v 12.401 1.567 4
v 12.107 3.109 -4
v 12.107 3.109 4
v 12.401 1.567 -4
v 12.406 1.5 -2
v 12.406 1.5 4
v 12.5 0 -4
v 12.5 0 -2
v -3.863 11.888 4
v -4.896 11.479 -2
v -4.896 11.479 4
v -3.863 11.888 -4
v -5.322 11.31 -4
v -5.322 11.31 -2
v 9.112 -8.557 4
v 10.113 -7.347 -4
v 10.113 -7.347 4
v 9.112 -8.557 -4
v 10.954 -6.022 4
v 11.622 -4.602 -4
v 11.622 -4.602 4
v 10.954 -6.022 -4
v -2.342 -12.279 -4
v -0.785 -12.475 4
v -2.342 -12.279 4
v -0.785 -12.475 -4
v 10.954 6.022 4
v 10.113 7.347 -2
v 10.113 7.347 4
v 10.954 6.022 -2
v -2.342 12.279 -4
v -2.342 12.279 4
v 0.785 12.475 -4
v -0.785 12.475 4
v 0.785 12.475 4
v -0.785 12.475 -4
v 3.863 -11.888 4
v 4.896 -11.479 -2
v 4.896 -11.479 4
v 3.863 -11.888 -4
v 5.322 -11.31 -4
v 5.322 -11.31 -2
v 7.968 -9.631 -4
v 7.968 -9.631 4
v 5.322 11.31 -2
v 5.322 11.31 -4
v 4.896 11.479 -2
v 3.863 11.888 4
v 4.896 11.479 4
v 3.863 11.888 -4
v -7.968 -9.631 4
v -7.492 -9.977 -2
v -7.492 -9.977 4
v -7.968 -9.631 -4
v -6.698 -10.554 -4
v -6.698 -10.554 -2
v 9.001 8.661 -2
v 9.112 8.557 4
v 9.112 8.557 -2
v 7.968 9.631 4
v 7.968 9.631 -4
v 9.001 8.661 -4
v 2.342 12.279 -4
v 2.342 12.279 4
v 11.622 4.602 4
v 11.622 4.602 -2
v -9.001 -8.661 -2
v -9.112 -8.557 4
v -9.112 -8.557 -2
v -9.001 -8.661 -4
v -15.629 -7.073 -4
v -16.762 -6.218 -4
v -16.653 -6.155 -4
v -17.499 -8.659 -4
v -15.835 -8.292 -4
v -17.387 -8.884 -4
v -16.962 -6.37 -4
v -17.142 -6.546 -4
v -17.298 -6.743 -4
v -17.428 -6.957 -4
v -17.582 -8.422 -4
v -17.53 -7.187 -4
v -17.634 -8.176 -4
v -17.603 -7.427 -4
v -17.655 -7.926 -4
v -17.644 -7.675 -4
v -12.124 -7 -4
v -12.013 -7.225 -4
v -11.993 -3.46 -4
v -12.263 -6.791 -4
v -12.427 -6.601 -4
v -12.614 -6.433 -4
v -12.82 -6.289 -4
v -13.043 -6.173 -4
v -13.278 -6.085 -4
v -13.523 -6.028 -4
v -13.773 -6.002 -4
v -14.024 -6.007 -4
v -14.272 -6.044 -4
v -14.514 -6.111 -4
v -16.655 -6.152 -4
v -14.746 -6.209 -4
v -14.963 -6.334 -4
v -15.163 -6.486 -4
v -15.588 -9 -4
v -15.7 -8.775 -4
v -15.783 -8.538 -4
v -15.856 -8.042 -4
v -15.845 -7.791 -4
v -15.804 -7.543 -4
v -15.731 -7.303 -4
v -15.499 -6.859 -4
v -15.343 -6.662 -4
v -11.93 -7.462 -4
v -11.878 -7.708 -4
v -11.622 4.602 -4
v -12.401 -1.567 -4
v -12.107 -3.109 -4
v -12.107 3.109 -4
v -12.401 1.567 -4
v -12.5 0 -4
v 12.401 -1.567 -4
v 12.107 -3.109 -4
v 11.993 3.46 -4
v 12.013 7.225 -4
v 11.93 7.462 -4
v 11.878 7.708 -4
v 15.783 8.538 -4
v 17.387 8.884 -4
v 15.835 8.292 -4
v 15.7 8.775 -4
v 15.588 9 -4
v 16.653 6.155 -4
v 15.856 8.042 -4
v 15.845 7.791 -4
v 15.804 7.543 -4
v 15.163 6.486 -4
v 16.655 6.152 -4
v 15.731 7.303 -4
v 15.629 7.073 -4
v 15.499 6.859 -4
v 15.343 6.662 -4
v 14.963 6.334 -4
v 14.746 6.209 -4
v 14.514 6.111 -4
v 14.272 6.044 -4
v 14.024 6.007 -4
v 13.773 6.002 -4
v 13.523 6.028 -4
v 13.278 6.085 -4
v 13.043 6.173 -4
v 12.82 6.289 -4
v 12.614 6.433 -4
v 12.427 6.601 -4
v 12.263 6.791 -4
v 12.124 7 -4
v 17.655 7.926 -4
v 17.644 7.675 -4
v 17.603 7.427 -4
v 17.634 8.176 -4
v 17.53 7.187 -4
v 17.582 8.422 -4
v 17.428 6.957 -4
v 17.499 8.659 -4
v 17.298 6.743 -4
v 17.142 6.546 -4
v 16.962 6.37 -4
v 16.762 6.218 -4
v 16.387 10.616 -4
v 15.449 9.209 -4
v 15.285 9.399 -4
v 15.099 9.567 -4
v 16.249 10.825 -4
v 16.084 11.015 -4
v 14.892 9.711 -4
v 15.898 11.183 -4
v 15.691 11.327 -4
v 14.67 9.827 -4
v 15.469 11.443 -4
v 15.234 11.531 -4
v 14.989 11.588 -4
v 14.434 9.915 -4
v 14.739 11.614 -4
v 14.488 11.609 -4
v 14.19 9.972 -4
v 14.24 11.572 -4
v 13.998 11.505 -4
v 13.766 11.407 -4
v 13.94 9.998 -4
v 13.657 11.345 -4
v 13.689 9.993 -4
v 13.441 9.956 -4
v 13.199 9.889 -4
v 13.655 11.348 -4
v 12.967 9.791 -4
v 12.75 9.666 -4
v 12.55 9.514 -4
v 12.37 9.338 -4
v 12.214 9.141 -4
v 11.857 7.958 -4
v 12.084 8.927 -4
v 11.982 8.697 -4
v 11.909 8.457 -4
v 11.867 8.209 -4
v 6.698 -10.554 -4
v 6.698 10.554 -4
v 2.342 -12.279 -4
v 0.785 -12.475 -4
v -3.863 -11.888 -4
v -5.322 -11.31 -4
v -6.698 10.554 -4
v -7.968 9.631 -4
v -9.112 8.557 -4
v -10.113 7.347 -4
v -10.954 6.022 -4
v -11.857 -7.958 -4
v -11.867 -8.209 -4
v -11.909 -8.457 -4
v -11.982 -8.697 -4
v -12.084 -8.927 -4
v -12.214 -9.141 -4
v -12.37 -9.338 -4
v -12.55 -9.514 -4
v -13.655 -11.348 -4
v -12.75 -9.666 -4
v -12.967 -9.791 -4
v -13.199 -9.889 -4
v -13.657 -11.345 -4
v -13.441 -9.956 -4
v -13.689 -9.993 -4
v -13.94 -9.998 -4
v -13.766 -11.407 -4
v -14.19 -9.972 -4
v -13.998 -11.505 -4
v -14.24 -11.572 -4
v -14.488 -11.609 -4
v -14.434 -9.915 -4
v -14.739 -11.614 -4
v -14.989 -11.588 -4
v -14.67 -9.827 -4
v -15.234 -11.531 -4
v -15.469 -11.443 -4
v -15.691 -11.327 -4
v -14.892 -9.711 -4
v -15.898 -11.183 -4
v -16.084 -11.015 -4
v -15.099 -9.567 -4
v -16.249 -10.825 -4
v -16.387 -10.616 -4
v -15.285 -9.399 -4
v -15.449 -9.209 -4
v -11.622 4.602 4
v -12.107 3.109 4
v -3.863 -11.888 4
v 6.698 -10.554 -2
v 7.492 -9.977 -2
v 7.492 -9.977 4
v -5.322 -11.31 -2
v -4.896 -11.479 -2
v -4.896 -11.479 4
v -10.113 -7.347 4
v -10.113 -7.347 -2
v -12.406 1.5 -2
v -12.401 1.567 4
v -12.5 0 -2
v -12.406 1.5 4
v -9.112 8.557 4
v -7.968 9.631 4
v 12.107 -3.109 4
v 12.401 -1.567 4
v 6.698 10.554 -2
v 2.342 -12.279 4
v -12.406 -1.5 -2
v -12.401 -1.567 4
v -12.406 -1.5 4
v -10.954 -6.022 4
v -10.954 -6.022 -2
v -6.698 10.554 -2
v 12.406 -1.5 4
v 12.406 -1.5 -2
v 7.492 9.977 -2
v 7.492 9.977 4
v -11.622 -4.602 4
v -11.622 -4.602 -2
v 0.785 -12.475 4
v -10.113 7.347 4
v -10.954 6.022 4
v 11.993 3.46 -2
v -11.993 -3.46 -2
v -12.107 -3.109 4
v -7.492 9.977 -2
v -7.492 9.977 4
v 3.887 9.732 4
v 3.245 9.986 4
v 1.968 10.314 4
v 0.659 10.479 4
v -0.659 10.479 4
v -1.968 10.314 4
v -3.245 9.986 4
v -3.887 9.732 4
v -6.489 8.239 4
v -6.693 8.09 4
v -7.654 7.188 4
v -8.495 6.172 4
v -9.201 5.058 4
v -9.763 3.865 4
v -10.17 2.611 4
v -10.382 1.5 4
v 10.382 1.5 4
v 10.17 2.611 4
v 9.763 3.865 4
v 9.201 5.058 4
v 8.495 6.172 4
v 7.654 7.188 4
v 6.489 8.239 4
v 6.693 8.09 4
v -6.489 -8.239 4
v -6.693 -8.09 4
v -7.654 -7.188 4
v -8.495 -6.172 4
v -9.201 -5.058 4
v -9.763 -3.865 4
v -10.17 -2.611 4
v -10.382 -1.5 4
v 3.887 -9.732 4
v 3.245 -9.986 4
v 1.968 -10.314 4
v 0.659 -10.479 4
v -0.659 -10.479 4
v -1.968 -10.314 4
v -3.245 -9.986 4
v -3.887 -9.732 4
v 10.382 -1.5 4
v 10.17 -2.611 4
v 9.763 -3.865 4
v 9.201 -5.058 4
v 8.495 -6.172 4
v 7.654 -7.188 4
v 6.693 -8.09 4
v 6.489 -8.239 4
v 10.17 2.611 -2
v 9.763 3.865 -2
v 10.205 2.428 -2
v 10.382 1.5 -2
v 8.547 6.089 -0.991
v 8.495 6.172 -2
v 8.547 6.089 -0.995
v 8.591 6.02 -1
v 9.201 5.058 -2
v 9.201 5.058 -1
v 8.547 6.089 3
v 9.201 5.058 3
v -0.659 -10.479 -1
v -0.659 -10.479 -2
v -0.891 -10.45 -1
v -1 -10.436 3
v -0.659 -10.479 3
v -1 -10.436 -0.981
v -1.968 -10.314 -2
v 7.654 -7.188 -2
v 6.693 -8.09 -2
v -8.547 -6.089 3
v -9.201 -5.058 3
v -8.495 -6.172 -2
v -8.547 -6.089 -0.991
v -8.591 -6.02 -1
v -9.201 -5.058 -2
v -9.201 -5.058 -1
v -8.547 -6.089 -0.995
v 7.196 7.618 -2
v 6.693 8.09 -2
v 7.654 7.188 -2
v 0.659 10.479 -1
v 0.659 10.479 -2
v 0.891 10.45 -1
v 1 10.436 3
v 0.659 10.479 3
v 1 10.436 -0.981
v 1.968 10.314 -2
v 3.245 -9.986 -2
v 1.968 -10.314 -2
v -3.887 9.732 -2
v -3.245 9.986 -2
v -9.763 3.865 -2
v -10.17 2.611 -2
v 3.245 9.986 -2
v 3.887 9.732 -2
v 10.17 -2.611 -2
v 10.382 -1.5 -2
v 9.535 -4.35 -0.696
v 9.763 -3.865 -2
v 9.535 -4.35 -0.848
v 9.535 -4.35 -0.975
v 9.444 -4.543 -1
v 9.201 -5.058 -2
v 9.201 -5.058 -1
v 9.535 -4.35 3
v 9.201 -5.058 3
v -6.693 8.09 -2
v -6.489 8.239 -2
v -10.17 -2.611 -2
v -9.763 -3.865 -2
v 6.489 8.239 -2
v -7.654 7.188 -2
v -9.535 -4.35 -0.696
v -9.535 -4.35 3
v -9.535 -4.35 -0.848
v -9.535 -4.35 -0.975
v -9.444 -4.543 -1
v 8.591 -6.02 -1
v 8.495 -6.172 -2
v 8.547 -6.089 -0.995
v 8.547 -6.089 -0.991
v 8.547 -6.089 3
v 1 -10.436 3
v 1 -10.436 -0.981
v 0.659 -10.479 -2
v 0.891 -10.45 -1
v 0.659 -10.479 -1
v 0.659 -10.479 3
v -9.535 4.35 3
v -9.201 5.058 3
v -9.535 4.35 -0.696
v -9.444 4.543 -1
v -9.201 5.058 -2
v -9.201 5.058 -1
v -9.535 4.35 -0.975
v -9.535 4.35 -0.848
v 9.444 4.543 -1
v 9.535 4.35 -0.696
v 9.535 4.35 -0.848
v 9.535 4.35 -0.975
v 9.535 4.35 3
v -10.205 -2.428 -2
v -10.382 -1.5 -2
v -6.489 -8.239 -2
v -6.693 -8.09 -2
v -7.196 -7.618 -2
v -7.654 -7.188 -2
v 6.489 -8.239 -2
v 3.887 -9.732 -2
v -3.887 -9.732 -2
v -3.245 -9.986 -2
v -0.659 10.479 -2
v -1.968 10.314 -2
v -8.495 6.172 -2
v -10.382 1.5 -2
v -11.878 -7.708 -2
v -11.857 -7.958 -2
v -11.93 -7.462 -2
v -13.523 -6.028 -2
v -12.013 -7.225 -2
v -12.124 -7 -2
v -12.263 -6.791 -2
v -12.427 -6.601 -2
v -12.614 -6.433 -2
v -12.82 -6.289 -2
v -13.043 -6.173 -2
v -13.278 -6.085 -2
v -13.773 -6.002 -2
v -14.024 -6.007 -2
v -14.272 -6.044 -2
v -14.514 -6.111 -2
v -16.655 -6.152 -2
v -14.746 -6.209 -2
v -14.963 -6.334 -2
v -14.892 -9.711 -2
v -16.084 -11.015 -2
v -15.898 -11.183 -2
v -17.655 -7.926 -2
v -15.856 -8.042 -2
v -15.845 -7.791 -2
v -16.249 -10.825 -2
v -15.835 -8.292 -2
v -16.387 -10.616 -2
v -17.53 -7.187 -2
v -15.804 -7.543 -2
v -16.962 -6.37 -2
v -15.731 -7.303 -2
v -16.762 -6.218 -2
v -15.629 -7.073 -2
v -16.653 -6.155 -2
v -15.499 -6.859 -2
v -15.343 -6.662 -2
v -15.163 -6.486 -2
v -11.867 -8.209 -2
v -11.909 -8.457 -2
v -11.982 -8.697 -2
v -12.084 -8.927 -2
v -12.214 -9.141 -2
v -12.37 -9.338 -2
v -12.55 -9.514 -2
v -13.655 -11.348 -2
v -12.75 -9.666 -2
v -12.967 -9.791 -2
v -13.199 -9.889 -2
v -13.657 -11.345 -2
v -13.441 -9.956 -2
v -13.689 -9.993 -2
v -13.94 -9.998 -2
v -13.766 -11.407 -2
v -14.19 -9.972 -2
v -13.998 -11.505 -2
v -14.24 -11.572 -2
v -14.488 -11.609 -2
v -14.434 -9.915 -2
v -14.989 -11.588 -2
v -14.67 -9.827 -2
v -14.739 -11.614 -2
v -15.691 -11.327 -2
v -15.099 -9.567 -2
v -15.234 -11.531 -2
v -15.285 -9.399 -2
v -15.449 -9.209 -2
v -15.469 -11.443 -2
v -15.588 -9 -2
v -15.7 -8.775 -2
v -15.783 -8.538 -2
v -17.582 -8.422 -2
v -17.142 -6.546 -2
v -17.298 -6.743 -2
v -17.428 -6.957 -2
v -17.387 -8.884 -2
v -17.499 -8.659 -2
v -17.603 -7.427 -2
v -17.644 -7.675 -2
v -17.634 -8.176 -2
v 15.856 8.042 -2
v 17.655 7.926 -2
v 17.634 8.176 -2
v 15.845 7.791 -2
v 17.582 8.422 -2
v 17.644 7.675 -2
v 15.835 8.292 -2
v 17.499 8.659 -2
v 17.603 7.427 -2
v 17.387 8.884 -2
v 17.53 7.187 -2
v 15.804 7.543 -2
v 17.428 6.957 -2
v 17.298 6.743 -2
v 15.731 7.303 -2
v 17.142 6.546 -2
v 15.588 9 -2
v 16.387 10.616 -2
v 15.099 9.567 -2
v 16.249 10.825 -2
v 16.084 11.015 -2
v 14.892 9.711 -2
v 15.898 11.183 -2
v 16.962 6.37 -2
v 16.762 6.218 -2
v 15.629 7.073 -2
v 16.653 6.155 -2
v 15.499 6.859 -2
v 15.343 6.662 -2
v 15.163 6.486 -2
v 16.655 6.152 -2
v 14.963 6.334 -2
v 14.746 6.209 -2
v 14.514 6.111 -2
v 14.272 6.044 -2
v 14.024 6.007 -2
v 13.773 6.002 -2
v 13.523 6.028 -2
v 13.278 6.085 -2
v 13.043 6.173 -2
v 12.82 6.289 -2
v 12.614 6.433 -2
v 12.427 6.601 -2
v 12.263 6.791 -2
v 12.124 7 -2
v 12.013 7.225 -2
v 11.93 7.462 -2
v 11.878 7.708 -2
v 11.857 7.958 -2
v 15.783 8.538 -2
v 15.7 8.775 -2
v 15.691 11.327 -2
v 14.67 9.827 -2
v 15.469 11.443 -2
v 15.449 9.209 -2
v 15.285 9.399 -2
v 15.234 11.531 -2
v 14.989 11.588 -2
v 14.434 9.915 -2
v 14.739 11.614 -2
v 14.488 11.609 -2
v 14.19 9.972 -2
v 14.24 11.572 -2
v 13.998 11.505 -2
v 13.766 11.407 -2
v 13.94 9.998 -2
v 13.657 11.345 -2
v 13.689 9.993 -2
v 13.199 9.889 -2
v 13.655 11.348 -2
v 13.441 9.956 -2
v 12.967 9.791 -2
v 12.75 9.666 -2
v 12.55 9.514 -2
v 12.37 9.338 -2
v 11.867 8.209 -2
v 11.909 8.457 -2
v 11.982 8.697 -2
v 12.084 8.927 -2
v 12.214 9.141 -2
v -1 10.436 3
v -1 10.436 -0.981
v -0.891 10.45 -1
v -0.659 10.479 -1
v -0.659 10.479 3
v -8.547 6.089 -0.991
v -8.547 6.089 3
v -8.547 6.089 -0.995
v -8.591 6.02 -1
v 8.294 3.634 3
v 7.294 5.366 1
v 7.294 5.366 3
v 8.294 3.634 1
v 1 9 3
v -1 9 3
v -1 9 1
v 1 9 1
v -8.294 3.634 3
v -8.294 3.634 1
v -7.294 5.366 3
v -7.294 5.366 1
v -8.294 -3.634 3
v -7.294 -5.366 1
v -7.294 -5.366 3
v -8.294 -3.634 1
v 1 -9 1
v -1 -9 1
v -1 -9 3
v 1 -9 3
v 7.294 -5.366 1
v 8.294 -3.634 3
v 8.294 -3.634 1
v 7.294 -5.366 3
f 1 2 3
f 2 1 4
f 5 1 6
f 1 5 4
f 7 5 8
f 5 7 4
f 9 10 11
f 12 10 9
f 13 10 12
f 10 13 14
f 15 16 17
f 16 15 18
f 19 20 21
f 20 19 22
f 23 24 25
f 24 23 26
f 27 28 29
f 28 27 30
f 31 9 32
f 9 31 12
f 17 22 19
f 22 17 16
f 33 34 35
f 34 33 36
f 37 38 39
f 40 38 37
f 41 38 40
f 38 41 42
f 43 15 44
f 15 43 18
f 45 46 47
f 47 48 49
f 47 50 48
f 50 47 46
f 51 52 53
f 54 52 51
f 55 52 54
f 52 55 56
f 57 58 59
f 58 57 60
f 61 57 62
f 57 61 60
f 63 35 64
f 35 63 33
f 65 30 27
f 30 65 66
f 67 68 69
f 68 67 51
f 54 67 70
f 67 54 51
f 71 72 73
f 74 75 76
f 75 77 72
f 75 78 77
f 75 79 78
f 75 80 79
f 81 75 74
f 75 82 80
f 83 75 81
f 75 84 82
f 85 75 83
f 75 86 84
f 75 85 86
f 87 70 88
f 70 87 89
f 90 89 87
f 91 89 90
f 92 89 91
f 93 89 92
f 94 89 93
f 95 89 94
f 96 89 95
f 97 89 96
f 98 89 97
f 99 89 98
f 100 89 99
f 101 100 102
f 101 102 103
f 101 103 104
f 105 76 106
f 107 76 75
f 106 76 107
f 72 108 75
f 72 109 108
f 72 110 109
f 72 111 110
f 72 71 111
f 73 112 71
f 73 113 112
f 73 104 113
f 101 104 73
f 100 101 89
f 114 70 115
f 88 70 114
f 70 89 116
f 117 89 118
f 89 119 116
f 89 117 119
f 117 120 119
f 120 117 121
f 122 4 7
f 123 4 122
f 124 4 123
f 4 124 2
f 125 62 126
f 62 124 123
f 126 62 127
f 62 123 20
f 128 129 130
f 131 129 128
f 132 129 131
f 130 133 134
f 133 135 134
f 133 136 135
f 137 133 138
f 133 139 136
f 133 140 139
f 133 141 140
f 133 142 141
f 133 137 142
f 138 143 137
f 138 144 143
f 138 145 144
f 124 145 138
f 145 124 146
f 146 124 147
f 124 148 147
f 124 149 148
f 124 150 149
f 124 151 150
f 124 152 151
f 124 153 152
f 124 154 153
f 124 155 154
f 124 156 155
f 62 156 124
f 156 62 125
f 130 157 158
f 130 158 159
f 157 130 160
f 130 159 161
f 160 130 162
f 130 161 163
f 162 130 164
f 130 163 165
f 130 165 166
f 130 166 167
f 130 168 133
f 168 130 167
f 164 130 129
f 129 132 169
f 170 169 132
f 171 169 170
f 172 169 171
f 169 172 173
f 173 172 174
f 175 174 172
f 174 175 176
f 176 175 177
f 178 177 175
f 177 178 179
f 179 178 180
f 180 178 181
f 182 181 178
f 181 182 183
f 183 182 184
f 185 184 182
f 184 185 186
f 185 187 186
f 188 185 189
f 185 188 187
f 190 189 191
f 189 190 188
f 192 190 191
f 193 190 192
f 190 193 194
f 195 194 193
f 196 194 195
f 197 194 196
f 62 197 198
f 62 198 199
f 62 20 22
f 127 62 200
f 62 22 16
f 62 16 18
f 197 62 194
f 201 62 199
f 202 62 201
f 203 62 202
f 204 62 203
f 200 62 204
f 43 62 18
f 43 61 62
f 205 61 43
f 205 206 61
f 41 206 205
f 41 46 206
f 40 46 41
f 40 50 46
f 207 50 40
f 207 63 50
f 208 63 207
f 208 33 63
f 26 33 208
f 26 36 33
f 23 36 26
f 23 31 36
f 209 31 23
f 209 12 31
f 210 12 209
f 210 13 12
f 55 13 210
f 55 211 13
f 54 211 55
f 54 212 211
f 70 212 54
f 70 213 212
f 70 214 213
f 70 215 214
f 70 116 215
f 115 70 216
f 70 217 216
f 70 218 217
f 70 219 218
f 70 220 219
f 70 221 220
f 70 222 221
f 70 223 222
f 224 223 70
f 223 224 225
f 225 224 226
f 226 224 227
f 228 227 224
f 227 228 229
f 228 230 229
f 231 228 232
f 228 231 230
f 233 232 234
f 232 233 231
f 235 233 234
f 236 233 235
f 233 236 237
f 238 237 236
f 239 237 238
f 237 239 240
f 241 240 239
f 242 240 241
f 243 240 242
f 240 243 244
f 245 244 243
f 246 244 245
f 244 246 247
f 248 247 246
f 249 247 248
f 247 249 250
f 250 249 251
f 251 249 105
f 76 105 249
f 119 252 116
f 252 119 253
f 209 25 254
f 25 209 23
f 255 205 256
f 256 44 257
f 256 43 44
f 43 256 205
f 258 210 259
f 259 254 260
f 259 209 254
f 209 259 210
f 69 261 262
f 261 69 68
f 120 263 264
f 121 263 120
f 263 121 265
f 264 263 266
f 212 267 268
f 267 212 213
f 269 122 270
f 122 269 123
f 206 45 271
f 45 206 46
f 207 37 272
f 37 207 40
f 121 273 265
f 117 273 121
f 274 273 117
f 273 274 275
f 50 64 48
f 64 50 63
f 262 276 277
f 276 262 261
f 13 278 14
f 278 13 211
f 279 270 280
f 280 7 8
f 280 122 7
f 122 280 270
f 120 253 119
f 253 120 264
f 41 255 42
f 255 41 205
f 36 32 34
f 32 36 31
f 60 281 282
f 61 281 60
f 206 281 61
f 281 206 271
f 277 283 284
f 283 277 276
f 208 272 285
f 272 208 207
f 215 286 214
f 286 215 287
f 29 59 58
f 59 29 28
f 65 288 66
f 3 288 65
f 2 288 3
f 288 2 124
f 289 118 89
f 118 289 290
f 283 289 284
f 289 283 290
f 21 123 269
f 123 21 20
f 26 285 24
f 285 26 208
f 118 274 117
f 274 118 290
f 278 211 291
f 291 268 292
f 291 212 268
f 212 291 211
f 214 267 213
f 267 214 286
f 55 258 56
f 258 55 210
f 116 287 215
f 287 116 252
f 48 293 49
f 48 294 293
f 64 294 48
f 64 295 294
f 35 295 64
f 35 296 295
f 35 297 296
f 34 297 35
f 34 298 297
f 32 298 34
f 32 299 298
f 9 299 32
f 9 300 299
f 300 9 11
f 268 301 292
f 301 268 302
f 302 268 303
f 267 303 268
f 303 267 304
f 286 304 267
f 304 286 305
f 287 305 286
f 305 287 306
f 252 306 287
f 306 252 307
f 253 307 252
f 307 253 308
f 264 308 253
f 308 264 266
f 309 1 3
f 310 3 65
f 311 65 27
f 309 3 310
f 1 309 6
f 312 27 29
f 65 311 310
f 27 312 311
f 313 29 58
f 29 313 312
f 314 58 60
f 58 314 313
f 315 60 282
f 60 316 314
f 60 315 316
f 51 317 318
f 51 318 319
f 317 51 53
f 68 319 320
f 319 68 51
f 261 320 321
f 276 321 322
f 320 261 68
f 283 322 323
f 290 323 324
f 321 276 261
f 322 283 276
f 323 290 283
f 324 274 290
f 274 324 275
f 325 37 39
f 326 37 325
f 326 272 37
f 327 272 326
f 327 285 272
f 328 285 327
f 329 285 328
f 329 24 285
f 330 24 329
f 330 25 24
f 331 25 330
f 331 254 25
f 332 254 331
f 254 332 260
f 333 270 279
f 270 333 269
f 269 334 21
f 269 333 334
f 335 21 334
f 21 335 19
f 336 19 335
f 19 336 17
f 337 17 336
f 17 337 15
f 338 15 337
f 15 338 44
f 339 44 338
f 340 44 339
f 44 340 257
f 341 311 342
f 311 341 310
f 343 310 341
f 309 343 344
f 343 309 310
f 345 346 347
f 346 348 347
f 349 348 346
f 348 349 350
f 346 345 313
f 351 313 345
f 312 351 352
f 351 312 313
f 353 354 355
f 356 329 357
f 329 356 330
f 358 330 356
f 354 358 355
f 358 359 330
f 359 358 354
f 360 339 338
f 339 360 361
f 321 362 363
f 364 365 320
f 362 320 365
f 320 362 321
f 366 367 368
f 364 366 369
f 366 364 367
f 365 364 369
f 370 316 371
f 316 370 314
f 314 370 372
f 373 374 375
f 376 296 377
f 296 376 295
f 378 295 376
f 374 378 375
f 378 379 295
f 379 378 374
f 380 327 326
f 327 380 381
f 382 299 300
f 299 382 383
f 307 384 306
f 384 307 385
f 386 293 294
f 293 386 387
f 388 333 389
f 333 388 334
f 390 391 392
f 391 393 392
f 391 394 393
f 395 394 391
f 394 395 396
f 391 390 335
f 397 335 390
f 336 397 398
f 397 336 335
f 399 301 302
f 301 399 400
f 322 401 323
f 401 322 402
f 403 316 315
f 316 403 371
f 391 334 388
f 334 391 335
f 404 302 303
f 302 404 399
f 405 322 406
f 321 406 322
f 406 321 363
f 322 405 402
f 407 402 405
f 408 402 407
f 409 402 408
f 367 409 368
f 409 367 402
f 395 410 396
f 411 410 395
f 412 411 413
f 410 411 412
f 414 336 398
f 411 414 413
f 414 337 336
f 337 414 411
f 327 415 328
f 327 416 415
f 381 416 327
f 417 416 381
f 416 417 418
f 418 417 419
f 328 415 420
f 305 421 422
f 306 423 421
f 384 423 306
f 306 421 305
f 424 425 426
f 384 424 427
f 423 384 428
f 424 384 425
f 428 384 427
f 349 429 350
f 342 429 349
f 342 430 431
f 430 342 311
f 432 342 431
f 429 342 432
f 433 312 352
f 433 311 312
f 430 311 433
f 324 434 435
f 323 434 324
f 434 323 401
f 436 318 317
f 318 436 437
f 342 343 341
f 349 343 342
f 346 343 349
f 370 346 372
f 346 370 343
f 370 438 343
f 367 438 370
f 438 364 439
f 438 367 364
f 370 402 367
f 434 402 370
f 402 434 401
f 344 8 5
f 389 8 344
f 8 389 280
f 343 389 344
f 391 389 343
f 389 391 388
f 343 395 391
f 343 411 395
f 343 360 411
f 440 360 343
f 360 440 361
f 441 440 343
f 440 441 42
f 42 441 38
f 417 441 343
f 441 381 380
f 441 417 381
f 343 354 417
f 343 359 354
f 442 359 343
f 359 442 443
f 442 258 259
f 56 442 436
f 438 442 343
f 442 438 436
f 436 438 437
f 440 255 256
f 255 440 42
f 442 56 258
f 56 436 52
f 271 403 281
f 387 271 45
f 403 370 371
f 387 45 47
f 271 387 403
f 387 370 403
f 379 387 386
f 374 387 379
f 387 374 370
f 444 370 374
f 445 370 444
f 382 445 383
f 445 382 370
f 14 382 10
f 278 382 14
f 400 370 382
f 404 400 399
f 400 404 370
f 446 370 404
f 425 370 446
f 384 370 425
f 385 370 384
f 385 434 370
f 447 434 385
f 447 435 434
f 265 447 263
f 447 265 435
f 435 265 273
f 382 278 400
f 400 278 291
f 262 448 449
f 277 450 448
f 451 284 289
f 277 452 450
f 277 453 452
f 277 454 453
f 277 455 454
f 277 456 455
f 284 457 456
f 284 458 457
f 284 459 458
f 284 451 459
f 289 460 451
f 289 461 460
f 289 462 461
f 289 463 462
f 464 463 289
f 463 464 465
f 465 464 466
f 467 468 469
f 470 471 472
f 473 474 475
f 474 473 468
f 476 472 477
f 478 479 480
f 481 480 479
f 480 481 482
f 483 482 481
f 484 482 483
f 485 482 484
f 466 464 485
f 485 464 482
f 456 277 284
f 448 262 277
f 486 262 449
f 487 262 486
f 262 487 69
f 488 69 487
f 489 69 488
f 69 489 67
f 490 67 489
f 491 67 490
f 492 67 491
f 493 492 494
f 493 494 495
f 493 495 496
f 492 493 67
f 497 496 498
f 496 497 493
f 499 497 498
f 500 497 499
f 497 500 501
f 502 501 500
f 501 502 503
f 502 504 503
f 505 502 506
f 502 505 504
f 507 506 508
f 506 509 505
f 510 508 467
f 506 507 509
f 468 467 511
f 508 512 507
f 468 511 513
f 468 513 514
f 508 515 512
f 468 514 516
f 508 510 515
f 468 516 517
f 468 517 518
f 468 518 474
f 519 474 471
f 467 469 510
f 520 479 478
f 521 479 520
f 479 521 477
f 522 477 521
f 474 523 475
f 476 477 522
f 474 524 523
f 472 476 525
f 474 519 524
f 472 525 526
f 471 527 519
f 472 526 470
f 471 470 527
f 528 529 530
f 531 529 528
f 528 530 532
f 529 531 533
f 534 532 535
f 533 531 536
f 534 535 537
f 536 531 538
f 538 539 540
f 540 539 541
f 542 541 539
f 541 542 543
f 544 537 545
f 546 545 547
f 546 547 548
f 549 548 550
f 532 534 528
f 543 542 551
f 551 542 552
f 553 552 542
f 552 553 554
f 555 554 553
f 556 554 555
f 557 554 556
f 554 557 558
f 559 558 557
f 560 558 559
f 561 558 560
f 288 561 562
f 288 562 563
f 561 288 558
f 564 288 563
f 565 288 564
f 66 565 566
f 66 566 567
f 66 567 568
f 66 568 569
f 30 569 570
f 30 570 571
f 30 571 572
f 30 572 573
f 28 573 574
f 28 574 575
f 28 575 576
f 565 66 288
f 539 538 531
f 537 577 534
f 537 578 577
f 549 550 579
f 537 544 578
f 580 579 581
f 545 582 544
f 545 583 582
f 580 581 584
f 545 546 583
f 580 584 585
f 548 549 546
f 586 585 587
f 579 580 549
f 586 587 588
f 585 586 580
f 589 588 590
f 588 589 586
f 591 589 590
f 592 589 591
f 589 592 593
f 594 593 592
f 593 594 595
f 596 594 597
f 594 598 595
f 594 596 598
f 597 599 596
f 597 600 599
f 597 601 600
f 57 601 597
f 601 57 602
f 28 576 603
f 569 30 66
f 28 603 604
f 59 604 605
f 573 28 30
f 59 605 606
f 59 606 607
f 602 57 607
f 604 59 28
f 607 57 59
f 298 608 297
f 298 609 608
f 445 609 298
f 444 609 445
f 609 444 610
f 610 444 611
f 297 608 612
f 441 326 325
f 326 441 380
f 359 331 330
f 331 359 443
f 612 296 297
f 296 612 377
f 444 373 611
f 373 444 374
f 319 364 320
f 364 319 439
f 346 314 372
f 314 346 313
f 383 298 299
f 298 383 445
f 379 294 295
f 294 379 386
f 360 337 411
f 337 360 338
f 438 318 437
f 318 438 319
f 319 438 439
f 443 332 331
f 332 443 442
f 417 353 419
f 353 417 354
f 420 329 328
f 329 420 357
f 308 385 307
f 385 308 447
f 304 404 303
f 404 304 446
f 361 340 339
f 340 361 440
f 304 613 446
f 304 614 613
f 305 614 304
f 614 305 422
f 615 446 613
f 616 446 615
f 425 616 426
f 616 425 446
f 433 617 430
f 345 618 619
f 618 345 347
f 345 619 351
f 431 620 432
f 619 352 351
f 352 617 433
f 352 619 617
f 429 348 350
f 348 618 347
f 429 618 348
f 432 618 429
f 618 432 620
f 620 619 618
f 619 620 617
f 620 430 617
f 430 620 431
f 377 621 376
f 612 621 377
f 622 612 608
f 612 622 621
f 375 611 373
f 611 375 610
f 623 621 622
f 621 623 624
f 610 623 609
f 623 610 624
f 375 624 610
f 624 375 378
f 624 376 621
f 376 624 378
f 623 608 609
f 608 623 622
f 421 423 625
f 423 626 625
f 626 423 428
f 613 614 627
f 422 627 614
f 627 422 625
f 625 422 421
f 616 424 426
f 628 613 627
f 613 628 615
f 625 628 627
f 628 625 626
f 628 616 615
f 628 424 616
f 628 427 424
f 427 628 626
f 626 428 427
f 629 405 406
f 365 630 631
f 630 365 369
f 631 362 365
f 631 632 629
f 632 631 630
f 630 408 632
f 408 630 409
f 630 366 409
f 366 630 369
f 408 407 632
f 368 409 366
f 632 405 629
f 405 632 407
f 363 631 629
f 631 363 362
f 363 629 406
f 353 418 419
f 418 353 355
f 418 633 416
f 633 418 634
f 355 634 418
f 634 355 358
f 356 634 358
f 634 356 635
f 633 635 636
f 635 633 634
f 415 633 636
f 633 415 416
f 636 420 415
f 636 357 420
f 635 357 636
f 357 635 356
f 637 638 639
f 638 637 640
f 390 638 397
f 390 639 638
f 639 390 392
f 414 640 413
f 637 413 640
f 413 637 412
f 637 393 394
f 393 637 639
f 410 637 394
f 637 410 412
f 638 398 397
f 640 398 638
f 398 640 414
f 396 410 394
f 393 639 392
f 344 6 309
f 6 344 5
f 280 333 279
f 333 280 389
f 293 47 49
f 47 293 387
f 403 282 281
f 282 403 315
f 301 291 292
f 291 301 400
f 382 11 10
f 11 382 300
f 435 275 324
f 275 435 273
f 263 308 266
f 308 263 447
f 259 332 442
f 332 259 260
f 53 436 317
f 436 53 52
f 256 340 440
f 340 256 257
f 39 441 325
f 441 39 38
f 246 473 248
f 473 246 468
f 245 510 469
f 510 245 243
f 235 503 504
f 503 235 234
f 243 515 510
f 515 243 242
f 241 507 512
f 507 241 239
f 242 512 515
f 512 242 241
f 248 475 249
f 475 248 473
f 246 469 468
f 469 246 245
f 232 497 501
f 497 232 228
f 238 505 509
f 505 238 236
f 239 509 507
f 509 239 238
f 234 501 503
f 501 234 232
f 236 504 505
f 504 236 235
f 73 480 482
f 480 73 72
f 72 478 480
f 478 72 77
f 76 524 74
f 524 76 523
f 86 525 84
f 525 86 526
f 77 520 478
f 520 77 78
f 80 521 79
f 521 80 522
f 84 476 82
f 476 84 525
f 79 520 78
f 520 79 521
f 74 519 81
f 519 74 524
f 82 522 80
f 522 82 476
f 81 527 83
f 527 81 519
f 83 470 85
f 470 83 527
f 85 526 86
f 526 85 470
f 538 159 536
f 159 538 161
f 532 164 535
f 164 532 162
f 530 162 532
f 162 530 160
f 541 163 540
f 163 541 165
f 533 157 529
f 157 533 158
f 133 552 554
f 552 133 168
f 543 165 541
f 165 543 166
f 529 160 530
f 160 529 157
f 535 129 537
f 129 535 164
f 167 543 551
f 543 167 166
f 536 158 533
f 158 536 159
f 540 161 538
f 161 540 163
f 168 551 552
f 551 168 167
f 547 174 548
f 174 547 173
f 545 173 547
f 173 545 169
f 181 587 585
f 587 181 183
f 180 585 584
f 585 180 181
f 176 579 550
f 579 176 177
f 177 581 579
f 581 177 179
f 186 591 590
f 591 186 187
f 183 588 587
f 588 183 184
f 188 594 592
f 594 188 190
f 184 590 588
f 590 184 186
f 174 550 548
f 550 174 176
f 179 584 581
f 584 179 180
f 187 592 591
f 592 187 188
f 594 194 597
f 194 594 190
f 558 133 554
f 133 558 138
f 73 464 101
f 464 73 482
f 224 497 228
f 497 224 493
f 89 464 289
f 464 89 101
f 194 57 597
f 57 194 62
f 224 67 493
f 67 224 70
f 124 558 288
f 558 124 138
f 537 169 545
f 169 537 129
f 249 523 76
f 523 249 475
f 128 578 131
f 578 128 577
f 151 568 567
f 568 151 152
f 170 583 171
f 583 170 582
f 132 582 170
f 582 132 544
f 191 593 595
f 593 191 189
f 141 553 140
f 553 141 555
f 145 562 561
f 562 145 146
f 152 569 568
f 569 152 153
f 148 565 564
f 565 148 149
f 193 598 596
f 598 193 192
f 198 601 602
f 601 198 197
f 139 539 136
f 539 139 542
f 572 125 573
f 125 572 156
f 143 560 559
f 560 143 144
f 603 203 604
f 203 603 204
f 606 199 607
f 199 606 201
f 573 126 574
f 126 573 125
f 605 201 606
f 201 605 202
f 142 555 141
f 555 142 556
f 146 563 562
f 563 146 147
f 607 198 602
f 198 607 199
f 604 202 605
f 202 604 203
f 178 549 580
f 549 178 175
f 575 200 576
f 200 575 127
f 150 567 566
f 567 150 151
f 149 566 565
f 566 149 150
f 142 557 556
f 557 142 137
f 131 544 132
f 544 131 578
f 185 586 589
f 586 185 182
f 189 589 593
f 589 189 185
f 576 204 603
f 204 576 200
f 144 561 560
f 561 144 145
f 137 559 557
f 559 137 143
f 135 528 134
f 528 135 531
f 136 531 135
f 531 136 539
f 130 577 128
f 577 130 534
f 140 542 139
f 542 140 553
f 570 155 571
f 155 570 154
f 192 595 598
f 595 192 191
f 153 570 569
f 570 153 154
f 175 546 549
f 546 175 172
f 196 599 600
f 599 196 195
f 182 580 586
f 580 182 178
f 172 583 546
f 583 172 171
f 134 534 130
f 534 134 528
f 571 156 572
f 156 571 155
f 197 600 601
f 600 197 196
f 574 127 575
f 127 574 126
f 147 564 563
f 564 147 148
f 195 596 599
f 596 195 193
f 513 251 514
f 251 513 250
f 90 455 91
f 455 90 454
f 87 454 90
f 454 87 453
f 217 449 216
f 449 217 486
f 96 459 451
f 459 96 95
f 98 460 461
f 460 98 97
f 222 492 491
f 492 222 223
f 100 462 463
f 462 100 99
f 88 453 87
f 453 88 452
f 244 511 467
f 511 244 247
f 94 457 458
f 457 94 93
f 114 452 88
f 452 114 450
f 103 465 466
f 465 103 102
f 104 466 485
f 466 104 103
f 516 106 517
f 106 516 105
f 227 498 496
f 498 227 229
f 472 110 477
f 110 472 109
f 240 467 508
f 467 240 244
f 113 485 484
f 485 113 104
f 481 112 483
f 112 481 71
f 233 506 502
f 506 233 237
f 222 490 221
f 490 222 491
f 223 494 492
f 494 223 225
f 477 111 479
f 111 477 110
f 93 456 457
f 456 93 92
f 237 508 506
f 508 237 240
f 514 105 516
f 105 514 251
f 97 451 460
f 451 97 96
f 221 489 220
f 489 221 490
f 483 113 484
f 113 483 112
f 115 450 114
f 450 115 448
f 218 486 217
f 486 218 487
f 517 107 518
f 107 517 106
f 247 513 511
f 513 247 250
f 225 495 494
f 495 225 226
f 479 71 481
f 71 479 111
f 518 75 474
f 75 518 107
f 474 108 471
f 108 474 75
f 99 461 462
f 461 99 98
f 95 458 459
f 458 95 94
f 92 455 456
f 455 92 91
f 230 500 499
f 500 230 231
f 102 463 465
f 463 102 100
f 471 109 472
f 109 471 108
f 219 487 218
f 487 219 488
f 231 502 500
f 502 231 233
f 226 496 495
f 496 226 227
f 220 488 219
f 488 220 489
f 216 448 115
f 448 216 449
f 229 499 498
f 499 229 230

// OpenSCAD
use <MCAD/boxes.scad>


$fn = 50;

wall = 2;
int_d = 21;
int_h = 6;
ext_d = int_d + wall * 2;
ext_h = int_h + wall;

hole_d = 4;
ext_size = hole_d+wall+1;

module led_pcb_holder() {

  difference() {
    union() {
      difference() {
        cylinder(d=ext_d, h=ext_h, center = true);
        translate([0, 0, (ext_h-int_h)/2]) {
          cylinder(d=int_d, h=int_h, center = true);
        }
      }
      for(p=[0:60:360]) {
        rotate([0, 0, p+30]) {
          translate([int_d/2, 0, -int_h/2+wall+3]) {
            hull() {
              cube([3, 2, 2], center=true);
              translate([0, 0, -2]) {
                cube([0.1, 2, 2], center=true);
              }
            }
          }
        }
      }
    }
    translate([0, 0, (ext_h-int_h)/2]) {
      for(p=[0:60:360]) {
        rotate([0, 0, p]) {
          translate([int_d/2, 0, 0]) {
            cube([wall*2, 3, int_h], center=true);
          }
        }
      }
    }
  }
  
  
  rotate([0, 0, 30]) {
    translate([0, 0, (-ext_h+wall)/2]) {
      difference() {
        roundedBox([ext_d+ext_size*2, hole_d + wall, wall], wall, true);
        translate([(ext_d+ext_size)/2, 0, 0]) {
          cylinder(d=hole_d, h=50, center=true);
        }
        translate([-(ext_d+ext_size)/2, 0, 0]) {
          cylinder(d=hole_d, h=50, center=true);
        }
      }
    }
  }
}

led_pcb_holder();
